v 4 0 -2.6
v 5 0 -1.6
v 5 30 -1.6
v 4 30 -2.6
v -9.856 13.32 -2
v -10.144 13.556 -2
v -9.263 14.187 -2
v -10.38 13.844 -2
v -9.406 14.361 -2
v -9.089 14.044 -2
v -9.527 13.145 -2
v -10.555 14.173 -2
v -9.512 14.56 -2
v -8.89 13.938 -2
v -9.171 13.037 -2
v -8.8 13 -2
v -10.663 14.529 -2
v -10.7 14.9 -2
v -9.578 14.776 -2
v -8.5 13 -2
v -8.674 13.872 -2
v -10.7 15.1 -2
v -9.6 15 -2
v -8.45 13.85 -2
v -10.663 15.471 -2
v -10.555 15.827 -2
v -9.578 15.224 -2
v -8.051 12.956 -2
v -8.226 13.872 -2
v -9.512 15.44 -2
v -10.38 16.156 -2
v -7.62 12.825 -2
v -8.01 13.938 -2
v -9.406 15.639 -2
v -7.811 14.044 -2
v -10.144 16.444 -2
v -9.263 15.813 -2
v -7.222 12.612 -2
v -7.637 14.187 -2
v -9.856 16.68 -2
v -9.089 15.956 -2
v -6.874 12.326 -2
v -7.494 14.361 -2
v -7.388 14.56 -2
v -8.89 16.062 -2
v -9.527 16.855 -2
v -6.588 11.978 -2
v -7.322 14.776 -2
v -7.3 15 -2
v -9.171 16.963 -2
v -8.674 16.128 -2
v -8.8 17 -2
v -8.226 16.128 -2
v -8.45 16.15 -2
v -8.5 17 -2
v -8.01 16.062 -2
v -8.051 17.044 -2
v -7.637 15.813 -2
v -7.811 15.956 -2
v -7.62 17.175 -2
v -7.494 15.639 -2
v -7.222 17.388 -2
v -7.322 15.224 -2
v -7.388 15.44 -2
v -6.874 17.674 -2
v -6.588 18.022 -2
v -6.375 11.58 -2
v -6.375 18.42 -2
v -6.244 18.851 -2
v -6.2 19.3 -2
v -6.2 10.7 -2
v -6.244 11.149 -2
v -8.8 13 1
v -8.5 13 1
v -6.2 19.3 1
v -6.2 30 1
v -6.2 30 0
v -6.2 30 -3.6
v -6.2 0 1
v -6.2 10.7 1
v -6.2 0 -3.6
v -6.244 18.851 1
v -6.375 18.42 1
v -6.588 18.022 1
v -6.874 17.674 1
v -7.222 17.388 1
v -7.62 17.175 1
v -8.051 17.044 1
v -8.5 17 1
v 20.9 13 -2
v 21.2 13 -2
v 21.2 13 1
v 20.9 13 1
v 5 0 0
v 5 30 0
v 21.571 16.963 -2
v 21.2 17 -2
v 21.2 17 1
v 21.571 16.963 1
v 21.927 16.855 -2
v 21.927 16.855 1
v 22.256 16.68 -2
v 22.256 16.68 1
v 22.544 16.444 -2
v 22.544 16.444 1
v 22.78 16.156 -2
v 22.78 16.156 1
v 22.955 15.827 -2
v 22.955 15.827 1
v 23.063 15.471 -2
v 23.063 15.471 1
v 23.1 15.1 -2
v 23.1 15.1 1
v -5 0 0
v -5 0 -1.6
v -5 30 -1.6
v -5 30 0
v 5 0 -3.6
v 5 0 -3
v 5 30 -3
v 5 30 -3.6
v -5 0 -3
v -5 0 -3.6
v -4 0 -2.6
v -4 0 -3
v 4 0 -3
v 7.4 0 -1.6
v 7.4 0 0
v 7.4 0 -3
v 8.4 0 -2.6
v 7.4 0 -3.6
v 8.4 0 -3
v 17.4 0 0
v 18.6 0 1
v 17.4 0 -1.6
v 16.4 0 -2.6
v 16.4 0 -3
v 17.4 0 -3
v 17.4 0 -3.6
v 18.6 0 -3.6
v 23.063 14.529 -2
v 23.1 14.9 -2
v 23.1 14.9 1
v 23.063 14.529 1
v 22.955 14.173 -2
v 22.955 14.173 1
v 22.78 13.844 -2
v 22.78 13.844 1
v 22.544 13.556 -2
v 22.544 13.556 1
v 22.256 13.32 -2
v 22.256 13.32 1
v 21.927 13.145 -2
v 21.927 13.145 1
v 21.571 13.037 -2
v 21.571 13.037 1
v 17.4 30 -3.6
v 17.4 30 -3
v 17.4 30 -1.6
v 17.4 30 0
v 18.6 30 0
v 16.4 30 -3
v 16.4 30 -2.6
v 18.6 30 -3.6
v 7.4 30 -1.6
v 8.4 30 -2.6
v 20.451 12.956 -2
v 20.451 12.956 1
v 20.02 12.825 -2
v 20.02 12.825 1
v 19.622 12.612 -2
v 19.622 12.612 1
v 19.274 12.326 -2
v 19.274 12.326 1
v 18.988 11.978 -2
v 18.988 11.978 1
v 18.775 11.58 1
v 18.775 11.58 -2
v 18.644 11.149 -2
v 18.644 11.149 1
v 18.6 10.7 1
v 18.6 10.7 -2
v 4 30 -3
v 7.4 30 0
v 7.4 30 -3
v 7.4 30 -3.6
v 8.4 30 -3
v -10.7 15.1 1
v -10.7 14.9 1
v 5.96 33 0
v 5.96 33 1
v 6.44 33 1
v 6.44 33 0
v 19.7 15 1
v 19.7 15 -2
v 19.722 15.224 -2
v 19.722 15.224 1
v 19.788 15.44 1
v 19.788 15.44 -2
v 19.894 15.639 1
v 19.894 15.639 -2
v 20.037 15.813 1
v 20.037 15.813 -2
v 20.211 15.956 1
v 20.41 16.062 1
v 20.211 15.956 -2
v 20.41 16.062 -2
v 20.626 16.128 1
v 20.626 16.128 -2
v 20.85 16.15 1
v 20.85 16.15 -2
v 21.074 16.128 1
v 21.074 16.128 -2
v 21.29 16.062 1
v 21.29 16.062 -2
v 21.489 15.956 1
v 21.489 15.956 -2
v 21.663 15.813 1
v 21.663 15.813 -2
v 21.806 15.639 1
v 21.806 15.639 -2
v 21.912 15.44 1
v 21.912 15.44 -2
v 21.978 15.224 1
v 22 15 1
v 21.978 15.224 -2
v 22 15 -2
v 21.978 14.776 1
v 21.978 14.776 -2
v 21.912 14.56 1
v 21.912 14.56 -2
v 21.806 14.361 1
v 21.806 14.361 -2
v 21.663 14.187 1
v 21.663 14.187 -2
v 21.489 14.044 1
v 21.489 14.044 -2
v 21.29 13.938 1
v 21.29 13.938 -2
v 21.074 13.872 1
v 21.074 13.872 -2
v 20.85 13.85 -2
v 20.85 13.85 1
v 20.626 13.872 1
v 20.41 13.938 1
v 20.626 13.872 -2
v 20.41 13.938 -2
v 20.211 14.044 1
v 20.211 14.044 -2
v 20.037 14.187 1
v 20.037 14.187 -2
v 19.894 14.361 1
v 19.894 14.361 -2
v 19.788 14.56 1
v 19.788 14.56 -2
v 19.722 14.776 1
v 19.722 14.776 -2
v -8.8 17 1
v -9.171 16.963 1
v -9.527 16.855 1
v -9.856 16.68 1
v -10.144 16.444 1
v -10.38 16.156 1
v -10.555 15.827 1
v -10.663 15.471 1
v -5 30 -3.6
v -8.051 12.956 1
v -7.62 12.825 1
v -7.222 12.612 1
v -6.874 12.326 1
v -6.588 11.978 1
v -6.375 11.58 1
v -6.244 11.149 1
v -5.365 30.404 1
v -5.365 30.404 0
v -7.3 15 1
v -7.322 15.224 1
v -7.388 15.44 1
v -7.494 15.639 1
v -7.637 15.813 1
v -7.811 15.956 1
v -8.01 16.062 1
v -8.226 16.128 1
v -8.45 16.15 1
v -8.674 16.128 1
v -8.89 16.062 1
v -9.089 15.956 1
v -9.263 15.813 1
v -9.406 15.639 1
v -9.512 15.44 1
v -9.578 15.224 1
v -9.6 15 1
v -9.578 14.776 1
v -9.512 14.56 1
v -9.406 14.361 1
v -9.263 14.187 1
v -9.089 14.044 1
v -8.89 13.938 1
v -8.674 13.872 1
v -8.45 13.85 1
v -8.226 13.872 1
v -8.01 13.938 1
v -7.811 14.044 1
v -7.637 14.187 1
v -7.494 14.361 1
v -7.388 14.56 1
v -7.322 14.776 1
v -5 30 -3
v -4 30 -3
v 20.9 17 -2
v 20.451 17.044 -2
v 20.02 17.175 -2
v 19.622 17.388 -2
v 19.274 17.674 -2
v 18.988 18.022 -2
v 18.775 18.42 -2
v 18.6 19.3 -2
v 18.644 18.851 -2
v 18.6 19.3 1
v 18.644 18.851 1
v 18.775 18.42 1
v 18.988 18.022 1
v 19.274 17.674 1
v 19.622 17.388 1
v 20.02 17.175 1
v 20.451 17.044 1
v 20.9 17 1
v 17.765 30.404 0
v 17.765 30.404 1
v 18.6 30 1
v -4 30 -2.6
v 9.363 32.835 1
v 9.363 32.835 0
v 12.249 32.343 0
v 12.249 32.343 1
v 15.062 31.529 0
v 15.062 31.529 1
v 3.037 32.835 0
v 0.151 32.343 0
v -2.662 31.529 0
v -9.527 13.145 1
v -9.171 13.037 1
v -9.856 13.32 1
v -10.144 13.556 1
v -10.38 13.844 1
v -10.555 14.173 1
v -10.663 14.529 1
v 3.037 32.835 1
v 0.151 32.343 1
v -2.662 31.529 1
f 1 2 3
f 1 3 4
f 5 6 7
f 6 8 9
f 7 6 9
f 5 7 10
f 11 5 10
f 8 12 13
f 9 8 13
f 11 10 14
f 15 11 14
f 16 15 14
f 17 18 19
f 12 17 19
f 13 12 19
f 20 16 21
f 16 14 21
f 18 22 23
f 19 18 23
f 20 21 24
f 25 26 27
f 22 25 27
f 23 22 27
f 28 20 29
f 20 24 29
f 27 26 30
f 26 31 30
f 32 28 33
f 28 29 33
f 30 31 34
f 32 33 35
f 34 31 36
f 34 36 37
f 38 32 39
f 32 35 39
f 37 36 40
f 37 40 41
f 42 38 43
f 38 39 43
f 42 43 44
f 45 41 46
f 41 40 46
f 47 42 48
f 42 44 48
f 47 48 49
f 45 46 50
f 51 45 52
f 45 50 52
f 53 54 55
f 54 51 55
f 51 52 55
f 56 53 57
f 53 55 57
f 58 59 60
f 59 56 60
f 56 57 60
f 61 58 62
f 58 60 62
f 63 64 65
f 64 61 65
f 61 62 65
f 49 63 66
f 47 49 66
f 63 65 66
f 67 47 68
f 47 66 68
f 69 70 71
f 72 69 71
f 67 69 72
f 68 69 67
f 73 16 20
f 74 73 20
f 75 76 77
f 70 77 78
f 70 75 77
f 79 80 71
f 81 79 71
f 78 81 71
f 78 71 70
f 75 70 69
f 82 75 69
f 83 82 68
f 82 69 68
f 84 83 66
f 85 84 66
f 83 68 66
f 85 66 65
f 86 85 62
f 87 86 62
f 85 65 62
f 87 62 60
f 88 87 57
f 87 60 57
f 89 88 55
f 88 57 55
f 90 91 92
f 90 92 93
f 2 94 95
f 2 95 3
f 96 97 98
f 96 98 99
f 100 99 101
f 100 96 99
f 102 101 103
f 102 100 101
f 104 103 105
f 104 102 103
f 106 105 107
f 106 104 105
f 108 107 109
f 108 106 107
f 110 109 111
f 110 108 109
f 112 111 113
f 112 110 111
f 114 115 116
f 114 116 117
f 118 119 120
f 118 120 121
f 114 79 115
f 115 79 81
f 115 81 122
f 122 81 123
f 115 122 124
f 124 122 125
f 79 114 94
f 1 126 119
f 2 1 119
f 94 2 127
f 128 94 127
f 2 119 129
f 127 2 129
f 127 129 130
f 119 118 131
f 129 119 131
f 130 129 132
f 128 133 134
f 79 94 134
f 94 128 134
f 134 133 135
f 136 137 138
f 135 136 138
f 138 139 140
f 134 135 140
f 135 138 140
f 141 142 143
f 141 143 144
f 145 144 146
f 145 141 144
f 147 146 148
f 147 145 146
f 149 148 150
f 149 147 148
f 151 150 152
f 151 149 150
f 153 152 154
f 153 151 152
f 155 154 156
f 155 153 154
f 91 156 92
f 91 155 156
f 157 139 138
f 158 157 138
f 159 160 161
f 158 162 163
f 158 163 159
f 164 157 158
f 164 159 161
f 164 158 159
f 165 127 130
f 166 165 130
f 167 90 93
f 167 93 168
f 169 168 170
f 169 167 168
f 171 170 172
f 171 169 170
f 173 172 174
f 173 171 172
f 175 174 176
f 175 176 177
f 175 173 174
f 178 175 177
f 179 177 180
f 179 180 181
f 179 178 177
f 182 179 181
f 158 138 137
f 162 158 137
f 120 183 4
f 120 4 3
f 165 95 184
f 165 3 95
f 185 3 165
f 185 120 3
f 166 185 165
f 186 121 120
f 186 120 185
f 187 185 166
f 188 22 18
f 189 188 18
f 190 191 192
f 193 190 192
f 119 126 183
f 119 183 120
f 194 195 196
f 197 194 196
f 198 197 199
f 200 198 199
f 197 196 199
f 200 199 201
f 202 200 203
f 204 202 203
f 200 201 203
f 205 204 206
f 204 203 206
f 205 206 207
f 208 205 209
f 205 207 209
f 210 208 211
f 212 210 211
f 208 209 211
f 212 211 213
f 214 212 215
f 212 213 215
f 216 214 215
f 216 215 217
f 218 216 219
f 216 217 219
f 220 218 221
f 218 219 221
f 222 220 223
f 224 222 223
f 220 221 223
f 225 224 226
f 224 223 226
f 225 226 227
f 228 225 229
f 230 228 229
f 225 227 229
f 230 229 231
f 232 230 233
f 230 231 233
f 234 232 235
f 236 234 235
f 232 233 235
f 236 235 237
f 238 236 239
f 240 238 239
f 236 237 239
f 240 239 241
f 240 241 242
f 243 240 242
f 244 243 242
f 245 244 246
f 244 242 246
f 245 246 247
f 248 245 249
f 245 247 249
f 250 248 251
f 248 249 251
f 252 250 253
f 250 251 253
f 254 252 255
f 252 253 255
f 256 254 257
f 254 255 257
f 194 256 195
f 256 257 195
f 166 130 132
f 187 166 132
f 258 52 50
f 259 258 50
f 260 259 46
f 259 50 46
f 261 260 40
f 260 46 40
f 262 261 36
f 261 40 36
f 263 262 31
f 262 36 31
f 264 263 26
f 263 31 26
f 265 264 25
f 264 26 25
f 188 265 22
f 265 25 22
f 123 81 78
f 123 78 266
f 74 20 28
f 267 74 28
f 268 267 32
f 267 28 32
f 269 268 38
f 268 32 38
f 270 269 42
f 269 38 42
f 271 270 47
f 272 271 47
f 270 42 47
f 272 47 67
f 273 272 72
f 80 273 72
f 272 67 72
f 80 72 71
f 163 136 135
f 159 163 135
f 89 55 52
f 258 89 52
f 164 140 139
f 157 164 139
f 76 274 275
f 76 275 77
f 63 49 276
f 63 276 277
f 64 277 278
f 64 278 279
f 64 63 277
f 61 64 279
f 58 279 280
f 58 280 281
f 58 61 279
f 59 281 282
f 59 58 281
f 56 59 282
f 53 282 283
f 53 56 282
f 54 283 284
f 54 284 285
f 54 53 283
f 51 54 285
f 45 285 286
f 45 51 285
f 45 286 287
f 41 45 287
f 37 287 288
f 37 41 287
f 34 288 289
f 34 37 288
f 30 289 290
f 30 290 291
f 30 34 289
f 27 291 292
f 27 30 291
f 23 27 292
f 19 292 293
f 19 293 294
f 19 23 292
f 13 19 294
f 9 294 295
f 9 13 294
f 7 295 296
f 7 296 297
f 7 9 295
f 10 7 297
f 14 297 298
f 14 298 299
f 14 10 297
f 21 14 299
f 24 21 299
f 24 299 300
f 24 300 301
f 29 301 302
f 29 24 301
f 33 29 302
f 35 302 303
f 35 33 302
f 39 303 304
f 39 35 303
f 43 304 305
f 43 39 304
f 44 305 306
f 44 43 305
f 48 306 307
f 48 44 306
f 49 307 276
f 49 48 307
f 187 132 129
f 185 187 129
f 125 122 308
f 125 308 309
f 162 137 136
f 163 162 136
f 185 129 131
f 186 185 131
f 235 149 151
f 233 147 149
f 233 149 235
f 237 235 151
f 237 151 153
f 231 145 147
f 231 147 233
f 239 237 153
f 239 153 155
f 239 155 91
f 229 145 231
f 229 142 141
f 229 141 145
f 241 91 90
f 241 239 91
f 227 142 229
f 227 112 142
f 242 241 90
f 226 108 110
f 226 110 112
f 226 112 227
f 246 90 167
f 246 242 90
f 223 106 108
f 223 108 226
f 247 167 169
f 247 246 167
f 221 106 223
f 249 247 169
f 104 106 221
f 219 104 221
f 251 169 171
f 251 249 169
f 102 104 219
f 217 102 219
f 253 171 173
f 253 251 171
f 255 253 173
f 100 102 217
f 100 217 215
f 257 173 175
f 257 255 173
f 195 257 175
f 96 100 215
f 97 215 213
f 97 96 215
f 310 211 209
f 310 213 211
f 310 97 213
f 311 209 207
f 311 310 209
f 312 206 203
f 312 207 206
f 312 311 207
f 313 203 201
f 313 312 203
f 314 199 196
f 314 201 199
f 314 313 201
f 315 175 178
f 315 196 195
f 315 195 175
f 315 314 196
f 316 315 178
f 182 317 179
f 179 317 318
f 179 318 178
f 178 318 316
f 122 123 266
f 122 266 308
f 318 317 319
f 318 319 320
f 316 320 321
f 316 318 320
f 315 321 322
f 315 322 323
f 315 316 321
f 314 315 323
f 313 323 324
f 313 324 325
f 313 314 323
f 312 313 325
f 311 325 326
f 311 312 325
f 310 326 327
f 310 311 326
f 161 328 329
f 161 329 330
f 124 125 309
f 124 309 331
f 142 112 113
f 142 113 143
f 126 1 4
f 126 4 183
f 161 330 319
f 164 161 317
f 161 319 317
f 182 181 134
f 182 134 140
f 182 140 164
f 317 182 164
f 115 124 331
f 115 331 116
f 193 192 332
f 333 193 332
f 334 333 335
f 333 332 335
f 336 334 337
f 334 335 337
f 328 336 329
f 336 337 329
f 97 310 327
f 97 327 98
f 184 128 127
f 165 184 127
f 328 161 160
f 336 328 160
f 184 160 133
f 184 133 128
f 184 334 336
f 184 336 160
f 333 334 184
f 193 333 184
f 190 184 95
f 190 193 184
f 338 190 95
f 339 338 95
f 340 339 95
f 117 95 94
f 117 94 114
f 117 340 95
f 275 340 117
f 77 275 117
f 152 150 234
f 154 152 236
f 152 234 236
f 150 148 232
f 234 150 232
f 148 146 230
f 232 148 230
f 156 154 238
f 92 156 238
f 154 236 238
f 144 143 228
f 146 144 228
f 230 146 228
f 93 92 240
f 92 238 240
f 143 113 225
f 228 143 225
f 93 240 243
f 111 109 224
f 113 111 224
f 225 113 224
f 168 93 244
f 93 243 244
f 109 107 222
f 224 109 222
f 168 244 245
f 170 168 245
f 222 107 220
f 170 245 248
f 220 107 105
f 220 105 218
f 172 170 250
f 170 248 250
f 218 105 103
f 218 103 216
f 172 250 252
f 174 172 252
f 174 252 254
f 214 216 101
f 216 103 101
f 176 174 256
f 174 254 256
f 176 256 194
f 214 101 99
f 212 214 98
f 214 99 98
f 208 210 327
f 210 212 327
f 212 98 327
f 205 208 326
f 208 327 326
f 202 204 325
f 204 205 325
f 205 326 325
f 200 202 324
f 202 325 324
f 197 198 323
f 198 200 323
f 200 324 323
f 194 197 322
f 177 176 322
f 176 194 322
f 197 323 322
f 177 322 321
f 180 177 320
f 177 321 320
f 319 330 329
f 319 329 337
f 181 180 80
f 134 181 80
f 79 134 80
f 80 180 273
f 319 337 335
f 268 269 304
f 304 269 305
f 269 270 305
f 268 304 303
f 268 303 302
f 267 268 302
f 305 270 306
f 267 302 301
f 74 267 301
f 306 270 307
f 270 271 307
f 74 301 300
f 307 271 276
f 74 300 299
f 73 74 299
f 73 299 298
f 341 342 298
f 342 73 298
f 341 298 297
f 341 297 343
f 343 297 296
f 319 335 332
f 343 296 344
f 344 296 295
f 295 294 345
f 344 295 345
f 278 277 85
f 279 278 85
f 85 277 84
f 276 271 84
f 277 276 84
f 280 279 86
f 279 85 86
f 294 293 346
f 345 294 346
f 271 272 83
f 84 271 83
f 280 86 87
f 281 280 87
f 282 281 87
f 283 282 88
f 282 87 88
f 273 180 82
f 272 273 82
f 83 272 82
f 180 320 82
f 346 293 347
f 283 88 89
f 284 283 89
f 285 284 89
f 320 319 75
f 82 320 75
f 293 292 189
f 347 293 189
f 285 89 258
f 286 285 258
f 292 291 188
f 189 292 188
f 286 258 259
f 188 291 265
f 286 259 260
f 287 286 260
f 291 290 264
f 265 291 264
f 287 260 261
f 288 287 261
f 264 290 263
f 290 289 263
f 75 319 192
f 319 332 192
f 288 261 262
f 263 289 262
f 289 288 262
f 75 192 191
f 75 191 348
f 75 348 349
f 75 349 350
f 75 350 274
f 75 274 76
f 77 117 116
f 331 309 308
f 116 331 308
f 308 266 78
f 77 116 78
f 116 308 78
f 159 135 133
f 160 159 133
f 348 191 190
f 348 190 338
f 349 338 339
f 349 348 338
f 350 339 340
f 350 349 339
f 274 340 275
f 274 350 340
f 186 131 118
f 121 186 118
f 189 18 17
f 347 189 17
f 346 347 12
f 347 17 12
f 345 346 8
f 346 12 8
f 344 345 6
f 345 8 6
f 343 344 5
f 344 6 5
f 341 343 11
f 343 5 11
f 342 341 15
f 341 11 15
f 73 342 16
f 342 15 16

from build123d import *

# Parameters (mm, degrees)
P_IDAT_VYSUNUT_M1_DEPTH = 30
P_IDAT_START            = -2
SKICA2_R                = 1.15
P_IDAT_VYSUNUT_M2_DEPTH = 3
P_IDAT_VYSUNUT_M3_DEPTH = 1


with BuildPart() as part:
    # Skica1 → Přidat vysunutím1 (new body)
    with BuildSketch(Plane(origin=(0, 0, 0), x_dir=(1, 0, 0), z_dir=(0, 1, 0))):
        Polygon((-5, 0), (5, 0), (5, 1.6), (4, 2.6), (4, 3), (5, 3), (5, 3.6), (6.2, 3.6), (6.2, -1), (-6.2, -1), (-6.2, 3.6), (-5, 3.6), (-5, 3), (-4, 3), (-4, 2.6), (-5, 1.6), align=None)
    p_idat_vysunut_m1 = extrude(amount=P_IDAT_VYSUNUT_M1_DEPTH)

    # Skica2 → Přidat vysunutím2 (add)
    with BuildSketch(Plane.XY.offset(P_IDAT_START)):
        with BuildLine():
            Line((-8.8, 13), (-8.5, 13))
            ThreePointArc((-8.5, 13), (-6.873654403, 12.326345597), (-6.2, 10.7))
            Line((-6.2, 10.7), (-6.2, 13))
            Line((-6.2, 13), (-6.2, 17))
            Line((-6.2, 17), (-6.2, 19.3))
            ThreePointArc((-6.2, 19.3), (-6.873654403, 17.673654403), (-8.5, 17))
            Line((-8.5, 17), (-8.8, 17))
            ThreePointArc((-8.8, 17), (-10.143502884, 16.443502884), (-10.7, 15.1))
            Line((-10.7, 15.1), (-10.7, 14.9))
            ThreePointArc((-10.7, 14.9), (-10.143502884, 13.556497116), (-8.8, 13))
        make_face()
        with Locations((-8.45, 15)):
            Circle(SKICA2_R, mode=Mode.SUBTRACT)
    p_idat_vysunut_m2 = extrude(amount=P_IDAT_VYSUNUT_M2_DEPTH)

    # Skica3 → Přidat vysunutím3 (add)
    with BuildSketch(Plane.XY.offset(1)):
        with BuildLine():
            Line((-6.2, 30), (6.2, 30))
            Line((6.2, 30), (6.2, 33))
            Line((6.2, 33), (5.959807907, 33))
            ThreePointArc((5.959807907, 33), (0.150662271, 32.3427273), (-5.364776224, 30.404140537))
            Line((-5.364776224, 30.404140537), (-6.2, 30))
        make_face()
    p_idat_vysunut_m3 = extrude(amount=-P_IDAT_VYSUNUT_M3_DEPTH)

    # Zrcadlit2: Přidat vysunutím1, Přidat vysunutím2, Přidat vysunutím3 across plane
    add(p_idat_vysunut_m1.mirror(Plane(origin=(6.2, 30, -3.6), x_dir=(0, 0, 1), z_dir=(-1, 0, 0))))
    add(p_idat_vysunut_m2.mirror(Plane(origin=(6.2, 30, -3.6), x_dir=(0, 0, 1), z_dir=(-1, 0, 0))))
    add(p_idat_vysunut_m3.mirror(Plane(origin=(6.2, 30, -3.6), x_dir=(0, 0, 1), z_dir=(-1, 0, 0))))


solid = part.part
